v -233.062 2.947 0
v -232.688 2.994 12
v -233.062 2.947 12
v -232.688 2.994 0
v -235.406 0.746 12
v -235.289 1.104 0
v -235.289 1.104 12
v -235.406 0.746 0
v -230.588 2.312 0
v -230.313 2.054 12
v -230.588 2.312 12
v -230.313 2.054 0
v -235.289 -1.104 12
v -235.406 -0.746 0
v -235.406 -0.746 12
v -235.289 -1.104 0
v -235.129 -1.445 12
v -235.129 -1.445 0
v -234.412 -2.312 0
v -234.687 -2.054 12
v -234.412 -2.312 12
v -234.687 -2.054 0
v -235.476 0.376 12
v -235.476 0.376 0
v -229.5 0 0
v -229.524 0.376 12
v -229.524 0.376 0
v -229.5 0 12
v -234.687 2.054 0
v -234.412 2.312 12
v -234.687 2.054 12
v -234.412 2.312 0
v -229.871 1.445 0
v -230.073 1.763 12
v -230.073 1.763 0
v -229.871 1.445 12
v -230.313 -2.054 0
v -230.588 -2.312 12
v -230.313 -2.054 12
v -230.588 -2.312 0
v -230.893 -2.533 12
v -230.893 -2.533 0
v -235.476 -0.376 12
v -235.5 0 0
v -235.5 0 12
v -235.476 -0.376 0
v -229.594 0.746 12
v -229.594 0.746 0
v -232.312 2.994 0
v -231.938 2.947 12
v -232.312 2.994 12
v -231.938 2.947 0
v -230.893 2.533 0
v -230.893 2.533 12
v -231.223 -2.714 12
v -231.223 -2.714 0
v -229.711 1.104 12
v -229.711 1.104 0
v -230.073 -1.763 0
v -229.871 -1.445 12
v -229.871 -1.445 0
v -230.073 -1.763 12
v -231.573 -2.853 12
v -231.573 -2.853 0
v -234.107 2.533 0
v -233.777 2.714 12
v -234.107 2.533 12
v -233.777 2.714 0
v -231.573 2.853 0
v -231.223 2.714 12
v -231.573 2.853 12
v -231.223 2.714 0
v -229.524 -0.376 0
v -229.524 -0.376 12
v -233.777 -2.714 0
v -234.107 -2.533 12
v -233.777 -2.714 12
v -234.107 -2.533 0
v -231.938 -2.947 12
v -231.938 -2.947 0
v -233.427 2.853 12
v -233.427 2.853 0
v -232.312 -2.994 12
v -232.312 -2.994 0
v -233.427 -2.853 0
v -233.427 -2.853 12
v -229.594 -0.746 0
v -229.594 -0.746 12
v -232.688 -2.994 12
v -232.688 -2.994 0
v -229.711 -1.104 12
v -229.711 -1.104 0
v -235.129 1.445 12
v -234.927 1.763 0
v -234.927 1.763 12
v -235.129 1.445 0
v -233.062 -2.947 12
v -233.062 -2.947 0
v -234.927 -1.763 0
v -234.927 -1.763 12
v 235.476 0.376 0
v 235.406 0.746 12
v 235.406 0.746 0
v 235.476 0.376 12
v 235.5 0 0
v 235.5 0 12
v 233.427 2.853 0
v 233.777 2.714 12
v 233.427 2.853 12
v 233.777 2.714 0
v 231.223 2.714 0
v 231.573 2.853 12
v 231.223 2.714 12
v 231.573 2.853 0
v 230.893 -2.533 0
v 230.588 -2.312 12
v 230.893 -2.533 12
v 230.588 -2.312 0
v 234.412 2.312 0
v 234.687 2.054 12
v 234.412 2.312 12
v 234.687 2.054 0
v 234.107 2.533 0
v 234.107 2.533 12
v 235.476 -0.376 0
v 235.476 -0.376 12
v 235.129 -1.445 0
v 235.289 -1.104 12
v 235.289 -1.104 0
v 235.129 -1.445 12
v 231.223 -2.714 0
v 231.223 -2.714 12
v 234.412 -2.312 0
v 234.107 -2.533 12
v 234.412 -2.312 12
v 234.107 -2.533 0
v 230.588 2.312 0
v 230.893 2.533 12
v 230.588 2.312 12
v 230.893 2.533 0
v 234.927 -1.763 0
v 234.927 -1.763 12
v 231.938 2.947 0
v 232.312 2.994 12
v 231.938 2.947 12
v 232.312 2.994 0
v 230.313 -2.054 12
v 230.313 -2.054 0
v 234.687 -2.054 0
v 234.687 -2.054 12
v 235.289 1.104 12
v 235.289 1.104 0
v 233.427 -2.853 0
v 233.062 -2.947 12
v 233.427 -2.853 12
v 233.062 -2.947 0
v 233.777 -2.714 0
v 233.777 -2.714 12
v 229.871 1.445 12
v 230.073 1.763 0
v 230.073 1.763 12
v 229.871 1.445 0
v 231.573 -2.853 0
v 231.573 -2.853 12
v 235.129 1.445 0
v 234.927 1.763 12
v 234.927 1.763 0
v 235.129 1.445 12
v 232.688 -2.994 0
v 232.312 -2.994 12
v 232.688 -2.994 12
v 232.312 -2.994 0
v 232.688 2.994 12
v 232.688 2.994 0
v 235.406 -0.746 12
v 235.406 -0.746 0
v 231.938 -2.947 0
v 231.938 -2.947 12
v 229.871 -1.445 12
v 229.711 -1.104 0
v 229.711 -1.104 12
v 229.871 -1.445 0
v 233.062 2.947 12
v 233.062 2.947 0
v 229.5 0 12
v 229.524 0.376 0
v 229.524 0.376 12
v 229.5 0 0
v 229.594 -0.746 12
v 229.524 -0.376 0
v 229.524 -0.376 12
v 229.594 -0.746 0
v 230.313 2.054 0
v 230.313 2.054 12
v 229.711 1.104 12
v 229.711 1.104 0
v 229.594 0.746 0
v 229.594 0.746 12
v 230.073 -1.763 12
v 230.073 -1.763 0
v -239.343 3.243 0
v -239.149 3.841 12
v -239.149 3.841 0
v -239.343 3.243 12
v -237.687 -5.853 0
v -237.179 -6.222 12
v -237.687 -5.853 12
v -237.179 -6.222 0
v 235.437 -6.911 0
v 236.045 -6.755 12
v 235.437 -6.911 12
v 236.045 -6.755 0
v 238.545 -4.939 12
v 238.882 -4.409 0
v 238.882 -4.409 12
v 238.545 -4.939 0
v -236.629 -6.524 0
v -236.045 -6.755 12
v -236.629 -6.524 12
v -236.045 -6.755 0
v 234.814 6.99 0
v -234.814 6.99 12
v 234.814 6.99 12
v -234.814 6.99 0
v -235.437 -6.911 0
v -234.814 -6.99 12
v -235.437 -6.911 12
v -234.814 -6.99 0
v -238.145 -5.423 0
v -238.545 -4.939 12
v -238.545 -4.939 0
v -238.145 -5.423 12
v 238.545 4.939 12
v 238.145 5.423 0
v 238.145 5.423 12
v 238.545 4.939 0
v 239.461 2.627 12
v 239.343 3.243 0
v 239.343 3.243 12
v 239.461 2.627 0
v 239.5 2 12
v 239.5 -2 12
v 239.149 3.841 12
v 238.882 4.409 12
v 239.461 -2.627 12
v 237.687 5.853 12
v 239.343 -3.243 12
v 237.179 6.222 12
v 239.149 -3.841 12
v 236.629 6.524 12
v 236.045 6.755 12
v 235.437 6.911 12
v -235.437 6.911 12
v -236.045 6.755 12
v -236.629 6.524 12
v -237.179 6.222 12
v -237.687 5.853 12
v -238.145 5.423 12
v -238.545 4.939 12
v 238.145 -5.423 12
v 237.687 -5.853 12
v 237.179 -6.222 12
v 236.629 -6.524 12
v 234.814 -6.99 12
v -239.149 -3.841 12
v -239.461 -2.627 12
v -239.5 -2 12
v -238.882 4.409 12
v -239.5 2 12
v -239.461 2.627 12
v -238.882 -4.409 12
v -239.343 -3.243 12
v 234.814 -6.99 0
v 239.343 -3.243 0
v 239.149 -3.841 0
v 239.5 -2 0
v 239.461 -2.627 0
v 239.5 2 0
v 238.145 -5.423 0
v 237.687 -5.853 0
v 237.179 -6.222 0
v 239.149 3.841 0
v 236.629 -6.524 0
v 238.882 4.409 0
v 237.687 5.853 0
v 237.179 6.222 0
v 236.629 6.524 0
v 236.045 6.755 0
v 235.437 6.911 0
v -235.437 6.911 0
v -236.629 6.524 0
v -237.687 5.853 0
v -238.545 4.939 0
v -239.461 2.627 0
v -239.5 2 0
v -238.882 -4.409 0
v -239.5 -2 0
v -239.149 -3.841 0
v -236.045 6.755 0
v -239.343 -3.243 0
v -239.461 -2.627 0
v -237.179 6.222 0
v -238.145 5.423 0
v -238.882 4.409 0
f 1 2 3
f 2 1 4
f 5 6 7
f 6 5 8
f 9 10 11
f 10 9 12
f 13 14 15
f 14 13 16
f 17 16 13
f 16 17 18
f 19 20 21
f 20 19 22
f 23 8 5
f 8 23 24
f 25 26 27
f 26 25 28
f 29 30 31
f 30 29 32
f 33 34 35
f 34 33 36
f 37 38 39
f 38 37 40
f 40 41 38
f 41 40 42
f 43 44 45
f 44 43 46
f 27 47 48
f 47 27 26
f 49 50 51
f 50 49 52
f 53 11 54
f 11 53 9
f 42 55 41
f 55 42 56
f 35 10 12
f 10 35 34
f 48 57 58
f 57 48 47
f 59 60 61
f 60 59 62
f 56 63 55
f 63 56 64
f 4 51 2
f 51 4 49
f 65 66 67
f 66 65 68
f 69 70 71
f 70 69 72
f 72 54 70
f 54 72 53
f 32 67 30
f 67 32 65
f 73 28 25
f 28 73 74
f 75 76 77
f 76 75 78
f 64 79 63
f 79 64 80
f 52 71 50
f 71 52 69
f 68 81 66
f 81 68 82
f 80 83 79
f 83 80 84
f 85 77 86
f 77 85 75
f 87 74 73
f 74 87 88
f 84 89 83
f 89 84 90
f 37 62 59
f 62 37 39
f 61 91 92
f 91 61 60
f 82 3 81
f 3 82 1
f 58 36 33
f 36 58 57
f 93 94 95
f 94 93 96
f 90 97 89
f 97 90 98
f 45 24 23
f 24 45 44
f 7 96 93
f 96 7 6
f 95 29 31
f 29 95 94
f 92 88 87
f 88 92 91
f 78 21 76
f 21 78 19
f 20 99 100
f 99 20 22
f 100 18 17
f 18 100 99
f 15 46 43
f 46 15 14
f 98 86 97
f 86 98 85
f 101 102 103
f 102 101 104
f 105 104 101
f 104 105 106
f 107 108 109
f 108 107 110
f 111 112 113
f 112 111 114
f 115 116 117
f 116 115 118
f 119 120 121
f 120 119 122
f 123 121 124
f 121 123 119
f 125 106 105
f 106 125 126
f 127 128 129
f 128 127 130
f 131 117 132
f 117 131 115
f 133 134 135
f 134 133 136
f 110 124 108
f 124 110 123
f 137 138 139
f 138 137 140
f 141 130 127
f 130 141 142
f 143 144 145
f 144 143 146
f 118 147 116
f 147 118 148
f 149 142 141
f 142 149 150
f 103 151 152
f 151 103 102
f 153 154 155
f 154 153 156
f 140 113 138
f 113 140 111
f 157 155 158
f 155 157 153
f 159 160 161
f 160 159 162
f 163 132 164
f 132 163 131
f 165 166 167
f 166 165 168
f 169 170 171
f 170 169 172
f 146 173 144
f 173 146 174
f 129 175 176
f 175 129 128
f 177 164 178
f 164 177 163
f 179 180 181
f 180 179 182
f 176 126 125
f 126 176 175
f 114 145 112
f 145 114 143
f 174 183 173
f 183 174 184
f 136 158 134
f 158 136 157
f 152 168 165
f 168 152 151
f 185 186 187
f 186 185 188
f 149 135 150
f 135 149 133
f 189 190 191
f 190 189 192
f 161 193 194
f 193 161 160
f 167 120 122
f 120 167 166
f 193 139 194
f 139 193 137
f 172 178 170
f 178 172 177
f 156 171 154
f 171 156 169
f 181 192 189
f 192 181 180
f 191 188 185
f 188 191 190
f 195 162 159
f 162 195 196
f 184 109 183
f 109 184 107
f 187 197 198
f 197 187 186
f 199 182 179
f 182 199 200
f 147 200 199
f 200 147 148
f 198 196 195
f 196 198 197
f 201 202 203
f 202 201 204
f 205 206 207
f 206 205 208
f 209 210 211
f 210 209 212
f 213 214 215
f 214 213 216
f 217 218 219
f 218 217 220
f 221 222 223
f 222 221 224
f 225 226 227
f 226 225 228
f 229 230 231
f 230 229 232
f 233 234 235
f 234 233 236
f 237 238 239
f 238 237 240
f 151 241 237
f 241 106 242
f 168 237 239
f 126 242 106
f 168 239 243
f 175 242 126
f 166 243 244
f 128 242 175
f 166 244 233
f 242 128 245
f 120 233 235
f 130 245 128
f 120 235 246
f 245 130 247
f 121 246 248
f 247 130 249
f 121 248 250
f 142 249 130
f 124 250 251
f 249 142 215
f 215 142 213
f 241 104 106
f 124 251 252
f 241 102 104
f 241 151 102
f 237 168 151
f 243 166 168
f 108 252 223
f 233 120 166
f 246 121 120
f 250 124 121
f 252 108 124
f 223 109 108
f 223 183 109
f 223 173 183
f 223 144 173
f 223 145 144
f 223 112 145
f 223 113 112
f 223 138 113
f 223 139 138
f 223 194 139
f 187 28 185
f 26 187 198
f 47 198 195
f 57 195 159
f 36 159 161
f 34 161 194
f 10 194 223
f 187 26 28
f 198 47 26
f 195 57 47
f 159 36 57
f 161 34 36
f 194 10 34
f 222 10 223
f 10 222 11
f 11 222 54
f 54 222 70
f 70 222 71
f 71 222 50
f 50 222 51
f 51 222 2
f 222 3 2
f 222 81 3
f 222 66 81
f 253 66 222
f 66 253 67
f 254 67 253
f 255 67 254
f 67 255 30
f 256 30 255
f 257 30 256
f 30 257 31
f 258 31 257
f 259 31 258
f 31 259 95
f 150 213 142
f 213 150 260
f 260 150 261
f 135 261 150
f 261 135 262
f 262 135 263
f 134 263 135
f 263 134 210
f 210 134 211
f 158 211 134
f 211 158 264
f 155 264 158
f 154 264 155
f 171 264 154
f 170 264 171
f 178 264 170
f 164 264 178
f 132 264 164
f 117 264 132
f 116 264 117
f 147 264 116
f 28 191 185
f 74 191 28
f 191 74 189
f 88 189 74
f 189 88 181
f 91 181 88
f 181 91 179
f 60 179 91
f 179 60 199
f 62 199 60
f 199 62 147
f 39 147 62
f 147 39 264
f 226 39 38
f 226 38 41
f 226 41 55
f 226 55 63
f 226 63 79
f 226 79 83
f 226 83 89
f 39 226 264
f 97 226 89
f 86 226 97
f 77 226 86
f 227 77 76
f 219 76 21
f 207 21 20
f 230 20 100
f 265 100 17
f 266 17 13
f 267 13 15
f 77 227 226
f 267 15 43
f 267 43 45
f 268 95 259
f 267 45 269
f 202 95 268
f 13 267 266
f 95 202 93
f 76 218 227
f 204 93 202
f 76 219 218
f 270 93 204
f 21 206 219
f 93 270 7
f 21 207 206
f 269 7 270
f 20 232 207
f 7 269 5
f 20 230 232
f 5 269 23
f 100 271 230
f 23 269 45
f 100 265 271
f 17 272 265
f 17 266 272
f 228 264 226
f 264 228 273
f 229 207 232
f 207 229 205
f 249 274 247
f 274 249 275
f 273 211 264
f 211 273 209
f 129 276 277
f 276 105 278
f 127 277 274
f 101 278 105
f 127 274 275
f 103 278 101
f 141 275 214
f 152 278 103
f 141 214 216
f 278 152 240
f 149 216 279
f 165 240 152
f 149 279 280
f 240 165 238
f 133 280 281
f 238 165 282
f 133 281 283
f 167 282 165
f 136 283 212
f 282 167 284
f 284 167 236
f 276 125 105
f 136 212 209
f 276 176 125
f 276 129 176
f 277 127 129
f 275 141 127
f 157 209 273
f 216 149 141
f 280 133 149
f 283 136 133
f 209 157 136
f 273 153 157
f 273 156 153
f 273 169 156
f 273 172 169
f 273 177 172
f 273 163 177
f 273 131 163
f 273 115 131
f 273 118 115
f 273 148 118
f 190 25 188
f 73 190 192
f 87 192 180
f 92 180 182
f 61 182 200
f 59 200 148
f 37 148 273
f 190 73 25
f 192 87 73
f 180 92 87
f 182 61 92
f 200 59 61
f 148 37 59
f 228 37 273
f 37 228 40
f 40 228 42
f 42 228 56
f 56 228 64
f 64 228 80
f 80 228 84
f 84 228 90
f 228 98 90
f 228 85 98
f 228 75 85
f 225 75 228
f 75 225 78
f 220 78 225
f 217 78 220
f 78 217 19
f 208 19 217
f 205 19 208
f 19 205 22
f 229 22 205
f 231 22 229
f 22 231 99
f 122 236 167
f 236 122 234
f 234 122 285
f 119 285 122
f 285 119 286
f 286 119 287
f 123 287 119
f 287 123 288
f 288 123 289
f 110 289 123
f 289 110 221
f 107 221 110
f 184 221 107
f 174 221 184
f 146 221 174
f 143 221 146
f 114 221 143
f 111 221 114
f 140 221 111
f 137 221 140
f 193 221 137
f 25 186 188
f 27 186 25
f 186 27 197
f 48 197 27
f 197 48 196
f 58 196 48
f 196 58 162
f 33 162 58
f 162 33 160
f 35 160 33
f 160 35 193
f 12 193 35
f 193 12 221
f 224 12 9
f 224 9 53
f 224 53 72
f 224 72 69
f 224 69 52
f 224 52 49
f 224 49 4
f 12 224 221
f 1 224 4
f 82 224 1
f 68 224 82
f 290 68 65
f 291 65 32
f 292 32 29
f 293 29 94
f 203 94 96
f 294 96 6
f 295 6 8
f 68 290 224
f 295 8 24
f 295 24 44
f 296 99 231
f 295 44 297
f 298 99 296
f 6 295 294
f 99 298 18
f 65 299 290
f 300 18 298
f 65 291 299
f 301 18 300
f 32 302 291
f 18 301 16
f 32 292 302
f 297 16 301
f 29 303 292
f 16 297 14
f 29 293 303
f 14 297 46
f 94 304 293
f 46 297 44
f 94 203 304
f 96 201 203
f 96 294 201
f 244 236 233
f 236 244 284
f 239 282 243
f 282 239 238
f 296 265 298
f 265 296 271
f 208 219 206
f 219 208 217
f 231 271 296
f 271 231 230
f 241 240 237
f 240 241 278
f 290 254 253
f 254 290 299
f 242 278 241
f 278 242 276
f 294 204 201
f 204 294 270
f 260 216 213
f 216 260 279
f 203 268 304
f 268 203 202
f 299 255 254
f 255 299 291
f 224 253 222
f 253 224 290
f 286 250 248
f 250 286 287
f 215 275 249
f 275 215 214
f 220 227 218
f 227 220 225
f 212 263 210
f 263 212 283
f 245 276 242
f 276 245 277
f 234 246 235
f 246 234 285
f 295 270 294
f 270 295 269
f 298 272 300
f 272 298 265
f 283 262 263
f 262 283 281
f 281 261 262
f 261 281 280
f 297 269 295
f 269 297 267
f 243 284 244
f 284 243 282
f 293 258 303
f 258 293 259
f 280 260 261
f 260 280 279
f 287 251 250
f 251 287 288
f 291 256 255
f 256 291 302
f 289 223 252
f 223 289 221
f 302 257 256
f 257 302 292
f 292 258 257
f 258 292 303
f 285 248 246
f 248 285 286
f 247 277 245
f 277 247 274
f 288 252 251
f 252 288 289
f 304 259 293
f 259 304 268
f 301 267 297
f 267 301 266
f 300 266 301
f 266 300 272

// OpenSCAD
$fn = 50;


difference() {
	union() {
		hull() {
			translate(v = [-234.5000000000, 2.0000000000, 0]) {
				cylinder(h = 12, r = 5);
			}
			translate(v = [234.5000000000, 2.0000000000, 0]) {
				cylinder(h = 12, r = 5);
			}
			translate(v = [-234.5000000000, -2.0000000000, 0]) {
				cylinder(h = 12, r = 5);
			}
			translate(v = [234.5000000000, -2.0000000000, 0]) {
				cylinder(h = 12, r = 5);
			}
		}
	}
	union() {
		translate(v = [-232.5000000000, 0.0000000000, -100.0000000000]) {
			cylinder(h = 200, r = 3.0000000000);
		}
		translate(v = [-232.5000000000, 0.0000000000, -100.0000000000]) {
			cylinder(h = 200, r = 3.0000000000);
		}
		translate(v = [232.5000000000, 0.0000000000, -100.0000000000]) {
			cylinder(h = 200, r = 3.0000000000);
		}
		translate(v = [232.5000000000, 0.0000000000, -100.0000000000]) {
			cylinder(h = 200, r = 3.0000000000);
		}
	}
}
